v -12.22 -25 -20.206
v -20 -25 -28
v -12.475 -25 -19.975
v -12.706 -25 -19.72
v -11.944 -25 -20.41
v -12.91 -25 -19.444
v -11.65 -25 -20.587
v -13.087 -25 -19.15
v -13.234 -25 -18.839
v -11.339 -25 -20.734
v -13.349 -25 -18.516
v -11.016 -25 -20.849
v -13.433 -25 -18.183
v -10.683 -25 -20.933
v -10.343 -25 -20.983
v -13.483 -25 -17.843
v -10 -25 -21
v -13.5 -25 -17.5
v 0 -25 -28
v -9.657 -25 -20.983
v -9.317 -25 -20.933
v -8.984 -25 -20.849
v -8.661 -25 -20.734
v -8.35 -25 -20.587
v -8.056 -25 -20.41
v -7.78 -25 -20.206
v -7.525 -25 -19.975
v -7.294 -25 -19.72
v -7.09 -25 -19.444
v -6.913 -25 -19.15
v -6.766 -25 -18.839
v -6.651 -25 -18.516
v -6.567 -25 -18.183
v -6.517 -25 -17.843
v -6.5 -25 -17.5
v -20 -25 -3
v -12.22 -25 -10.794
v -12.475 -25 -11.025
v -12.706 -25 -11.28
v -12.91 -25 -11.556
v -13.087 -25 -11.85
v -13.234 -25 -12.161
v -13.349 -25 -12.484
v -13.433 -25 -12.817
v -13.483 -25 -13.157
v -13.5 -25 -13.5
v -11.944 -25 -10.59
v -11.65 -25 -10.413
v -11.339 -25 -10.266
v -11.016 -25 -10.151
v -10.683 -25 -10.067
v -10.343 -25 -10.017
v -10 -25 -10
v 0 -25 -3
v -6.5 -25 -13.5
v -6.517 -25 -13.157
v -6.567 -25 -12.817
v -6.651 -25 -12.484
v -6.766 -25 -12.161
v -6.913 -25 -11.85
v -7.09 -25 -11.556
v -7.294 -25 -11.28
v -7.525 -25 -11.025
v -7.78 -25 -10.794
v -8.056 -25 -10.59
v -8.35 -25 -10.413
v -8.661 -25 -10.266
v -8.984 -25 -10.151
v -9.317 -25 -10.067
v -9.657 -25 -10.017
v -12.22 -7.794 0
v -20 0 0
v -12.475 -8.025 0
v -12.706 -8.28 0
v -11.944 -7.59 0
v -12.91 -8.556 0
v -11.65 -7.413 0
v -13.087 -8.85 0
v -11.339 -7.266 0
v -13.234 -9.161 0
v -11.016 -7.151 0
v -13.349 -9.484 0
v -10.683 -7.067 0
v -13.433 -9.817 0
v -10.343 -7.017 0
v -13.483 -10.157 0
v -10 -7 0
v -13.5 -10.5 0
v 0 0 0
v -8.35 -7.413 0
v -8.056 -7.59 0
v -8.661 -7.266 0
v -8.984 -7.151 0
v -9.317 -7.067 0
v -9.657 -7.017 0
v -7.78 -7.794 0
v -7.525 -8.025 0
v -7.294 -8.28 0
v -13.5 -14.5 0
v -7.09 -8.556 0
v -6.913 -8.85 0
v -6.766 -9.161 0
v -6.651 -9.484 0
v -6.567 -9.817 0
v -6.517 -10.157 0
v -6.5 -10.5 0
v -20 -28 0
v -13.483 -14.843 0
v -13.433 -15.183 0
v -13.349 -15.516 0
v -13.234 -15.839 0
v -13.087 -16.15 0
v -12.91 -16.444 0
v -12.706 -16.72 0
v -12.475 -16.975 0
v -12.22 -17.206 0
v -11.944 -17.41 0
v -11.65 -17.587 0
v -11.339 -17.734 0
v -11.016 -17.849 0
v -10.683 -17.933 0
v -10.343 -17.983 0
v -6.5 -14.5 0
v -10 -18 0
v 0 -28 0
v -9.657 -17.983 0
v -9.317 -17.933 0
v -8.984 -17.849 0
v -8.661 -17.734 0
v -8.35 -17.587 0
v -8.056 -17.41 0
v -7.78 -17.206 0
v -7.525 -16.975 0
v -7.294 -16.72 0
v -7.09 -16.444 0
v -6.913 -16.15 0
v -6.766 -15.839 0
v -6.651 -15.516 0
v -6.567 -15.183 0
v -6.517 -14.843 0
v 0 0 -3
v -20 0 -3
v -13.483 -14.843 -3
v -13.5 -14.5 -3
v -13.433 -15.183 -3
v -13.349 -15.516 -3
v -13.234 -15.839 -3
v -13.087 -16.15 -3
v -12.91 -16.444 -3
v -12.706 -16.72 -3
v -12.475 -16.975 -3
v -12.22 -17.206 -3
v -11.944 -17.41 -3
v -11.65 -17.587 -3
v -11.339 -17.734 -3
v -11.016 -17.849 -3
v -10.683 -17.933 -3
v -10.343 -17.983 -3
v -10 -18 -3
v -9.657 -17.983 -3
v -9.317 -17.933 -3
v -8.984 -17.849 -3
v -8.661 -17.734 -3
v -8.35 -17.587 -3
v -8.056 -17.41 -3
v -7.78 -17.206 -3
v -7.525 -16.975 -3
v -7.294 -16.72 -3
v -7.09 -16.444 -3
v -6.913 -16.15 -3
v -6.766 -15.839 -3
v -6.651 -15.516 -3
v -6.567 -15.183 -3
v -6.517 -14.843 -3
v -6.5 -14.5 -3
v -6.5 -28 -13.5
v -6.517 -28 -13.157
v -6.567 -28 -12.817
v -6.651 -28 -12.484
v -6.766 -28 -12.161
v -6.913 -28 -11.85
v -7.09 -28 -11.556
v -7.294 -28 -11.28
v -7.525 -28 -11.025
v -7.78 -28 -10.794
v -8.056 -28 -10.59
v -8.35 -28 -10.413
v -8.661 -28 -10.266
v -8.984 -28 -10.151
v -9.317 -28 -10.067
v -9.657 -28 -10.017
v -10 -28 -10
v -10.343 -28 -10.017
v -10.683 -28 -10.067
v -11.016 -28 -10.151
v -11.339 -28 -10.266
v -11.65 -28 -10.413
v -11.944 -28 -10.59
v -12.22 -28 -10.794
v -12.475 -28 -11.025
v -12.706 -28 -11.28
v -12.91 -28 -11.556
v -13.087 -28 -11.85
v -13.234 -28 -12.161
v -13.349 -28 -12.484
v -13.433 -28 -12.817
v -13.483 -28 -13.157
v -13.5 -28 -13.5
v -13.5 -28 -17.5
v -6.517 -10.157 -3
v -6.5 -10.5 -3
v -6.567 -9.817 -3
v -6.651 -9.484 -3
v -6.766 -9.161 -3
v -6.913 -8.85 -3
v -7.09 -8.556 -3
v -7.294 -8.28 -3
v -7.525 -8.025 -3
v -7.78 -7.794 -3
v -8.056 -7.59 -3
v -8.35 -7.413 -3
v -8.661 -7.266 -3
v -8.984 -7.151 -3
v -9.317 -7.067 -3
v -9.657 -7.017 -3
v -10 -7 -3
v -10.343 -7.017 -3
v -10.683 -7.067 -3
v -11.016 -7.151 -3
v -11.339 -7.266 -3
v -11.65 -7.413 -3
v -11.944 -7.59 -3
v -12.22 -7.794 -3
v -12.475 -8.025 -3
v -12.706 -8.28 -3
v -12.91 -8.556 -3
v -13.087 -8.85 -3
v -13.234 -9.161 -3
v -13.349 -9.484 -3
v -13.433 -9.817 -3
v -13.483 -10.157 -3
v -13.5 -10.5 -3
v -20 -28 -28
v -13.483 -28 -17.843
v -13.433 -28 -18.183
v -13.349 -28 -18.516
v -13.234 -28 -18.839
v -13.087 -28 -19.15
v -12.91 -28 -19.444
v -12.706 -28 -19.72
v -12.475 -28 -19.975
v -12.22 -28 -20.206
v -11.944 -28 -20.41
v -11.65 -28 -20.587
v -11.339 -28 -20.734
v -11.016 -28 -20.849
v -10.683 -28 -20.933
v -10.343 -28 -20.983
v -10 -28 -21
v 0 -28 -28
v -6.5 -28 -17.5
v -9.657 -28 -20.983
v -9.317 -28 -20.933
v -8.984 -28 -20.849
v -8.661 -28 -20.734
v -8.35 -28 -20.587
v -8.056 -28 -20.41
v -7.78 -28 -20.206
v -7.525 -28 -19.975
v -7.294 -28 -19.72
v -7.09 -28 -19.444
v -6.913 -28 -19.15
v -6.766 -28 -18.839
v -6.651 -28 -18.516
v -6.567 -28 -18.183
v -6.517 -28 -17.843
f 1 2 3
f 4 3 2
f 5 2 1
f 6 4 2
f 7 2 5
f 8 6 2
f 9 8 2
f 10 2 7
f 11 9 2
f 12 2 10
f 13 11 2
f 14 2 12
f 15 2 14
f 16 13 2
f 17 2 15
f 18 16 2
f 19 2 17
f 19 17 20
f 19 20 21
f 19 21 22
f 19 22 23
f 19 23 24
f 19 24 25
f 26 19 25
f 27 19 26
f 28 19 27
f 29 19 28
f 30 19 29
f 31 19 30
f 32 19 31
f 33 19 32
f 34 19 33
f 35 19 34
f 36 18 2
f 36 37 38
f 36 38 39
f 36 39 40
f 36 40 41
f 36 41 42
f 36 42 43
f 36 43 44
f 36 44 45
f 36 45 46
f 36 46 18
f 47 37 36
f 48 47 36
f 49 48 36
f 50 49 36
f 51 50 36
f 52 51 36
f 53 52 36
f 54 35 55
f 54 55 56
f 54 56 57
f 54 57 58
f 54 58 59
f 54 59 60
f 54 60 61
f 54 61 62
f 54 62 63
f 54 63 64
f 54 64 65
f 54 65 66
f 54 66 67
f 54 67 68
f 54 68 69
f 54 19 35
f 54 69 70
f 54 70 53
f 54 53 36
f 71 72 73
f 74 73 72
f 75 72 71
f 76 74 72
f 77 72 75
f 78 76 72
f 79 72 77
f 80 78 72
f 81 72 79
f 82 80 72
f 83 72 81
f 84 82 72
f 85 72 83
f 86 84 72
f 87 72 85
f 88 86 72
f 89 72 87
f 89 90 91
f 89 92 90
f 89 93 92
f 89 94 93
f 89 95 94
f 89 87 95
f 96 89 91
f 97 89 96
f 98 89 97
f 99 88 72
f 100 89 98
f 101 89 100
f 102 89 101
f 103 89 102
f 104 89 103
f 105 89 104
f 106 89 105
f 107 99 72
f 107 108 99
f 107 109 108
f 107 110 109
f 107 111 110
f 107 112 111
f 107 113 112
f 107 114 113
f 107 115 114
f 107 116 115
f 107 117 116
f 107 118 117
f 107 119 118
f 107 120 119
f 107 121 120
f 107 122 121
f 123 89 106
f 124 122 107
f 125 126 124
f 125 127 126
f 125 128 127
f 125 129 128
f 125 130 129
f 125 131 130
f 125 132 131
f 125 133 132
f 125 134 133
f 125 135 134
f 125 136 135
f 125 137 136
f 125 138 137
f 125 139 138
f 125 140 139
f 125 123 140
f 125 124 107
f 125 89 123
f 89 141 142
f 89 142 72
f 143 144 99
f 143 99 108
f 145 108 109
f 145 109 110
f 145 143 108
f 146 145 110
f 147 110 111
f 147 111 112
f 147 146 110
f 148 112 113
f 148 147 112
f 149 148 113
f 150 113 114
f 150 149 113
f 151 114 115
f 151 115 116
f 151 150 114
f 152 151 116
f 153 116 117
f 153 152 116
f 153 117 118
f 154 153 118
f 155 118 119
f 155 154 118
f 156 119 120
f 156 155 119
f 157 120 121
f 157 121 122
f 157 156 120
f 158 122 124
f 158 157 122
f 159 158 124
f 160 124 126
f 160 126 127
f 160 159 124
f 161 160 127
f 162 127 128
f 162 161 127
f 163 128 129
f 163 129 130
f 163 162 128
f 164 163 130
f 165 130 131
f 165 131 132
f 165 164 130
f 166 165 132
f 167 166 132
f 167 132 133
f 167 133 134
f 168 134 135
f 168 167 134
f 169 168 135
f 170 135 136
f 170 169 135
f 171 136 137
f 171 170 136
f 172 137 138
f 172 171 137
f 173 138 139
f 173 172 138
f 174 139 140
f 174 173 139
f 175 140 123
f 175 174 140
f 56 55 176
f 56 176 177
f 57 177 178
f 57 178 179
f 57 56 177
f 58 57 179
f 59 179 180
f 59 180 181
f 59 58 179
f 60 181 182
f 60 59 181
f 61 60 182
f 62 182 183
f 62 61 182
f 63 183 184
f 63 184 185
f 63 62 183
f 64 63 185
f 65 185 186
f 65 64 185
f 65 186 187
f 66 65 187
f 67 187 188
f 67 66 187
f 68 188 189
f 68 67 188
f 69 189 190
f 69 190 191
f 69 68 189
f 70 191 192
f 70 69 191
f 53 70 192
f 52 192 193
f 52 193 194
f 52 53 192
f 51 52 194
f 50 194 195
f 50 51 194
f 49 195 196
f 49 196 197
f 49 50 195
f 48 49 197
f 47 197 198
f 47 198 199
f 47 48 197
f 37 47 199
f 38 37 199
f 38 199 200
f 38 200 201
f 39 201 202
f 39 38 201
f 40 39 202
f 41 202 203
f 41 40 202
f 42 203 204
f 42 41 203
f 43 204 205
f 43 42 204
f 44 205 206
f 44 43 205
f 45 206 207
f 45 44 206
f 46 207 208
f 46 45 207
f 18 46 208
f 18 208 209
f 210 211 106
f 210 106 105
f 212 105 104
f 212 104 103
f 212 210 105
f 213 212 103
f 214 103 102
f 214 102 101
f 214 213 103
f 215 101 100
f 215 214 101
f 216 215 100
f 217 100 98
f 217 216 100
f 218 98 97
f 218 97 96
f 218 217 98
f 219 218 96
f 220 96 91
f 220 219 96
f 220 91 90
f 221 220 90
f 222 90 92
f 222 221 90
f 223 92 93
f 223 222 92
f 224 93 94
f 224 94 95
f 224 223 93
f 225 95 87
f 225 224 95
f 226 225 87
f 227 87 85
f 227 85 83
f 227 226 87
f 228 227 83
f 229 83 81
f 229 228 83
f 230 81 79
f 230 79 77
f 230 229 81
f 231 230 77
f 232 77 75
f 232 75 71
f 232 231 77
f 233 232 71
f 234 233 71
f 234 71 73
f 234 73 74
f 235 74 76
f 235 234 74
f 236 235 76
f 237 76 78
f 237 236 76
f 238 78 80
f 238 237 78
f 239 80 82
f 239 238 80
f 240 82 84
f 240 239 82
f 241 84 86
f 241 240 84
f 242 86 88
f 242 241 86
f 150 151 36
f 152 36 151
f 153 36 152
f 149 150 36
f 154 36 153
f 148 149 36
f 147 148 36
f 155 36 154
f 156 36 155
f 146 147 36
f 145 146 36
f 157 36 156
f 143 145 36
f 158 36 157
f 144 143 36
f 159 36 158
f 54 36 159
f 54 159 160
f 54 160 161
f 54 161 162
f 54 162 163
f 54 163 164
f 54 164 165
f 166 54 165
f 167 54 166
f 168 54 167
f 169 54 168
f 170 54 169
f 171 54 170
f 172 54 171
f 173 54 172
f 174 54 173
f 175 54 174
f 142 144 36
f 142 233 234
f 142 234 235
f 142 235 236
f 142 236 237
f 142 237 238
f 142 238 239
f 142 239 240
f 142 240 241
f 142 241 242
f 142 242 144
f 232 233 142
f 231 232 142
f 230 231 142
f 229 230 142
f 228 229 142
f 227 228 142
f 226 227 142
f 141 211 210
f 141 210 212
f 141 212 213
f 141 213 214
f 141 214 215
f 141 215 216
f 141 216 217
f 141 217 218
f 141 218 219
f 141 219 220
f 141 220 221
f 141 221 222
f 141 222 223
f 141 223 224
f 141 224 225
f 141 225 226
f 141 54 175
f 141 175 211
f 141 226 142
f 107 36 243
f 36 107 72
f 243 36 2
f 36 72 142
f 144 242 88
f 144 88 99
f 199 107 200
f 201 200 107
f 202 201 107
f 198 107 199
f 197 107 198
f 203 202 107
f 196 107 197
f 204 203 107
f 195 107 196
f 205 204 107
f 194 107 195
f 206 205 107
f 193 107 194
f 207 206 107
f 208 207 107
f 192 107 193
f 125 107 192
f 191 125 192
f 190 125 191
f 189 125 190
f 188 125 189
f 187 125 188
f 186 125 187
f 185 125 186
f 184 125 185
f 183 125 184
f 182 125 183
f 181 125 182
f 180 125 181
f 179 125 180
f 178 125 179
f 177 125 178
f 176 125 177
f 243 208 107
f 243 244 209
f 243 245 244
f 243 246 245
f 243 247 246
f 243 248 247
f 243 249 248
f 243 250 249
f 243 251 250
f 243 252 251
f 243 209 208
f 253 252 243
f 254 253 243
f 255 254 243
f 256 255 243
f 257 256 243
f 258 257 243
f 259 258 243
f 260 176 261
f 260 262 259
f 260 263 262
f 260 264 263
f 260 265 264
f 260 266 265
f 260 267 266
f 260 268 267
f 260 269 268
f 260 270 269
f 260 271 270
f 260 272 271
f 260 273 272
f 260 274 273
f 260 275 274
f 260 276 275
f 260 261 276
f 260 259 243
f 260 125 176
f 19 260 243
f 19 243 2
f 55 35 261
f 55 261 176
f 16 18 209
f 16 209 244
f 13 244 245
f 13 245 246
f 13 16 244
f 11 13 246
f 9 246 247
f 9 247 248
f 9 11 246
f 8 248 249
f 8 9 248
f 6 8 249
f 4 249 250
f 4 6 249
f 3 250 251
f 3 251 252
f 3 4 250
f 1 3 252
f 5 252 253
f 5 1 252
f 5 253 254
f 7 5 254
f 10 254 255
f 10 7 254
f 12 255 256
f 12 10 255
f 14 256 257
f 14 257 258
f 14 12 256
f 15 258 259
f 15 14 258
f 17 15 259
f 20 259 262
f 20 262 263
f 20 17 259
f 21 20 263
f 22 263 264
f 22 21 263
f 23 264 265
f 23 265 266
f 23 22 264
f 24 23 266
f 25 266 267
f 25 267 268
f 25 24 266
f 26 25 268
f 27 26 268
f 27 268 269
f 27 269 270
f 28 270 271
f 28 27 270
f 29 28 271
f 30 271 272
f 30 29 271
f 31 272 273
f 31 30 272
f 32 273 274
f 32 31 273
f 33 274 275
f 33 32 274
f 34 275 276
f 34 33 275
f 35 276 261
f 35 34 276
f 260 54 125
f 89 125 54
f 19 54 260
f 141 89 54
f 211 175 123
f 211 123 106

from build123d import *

# Parameters (mm, degrees)
BOSS_EXTRUDE2_DEPTH = 20
CUT_EXTRUDE1_DEPTH  = 3
CUT_EXTRUDE2_DEPTH  = 3


with BuildPart() as part:
    # Sketch1 → Boss-Extrude2 (new body)
    with BuildSketch(Plane(origin=(0, 0, 0), x_dir=(0, 0, -1), z_dir=(1, 0, 0))):
        Polygon((0, 0), (0, -28), (28, -28), (28, -25), (3, -25), (3, 0), align=None)
    extrude(amount=-BOSS_EXTRUDE2_DEPTH)

    # Sketch4 → Cut-Extrude1 (cut)
    with BuildSketch(Plane(origin=(0, -25, 0), x_dir=(1, 0, 0), z_dir=(0, 1, 0))):
        with BuildLine():
            Line((-6.5, 17.5), (-6.5, 13.5))
            ThreePointArc((-6.5, 13.5), (-10, 10), (-13.5, 13.5))
            Line((-13.5, 13.5), (-13.5, 17.5))
            ThreePointArc((-13.5, 17.5), (-10, 21), (-6.5, 17.5))
        make_face()
    extrude(amount=-CUT_EXTRUDE1_DEPTH, mode=Mode.SUBTRACT)

    # Sketch5 → Cut-Extrude2 (cut)
    with BuildSketch(Plane(origin=(0, 0, -3), x_dir=(-1, 0, 0), z_dir=(0, 0, -1))):
        with BuildLine():
            Line((13.5, -10.5), (13.5, -14.5))
            ThreePointArc((13.5, -14.5), (10, -18), (6.5, -14.5))
            Line((6.5, -14.5), (6.5, -10.5))
            ThreePointArc((6.5, -10.5), (10, -7), (13.5, -10.5))
        make_face()
    extrude(amount=-CUT_EXTRUDE2_DEPTH, mode=Mode.SUBTRACT)


solid = part.part
